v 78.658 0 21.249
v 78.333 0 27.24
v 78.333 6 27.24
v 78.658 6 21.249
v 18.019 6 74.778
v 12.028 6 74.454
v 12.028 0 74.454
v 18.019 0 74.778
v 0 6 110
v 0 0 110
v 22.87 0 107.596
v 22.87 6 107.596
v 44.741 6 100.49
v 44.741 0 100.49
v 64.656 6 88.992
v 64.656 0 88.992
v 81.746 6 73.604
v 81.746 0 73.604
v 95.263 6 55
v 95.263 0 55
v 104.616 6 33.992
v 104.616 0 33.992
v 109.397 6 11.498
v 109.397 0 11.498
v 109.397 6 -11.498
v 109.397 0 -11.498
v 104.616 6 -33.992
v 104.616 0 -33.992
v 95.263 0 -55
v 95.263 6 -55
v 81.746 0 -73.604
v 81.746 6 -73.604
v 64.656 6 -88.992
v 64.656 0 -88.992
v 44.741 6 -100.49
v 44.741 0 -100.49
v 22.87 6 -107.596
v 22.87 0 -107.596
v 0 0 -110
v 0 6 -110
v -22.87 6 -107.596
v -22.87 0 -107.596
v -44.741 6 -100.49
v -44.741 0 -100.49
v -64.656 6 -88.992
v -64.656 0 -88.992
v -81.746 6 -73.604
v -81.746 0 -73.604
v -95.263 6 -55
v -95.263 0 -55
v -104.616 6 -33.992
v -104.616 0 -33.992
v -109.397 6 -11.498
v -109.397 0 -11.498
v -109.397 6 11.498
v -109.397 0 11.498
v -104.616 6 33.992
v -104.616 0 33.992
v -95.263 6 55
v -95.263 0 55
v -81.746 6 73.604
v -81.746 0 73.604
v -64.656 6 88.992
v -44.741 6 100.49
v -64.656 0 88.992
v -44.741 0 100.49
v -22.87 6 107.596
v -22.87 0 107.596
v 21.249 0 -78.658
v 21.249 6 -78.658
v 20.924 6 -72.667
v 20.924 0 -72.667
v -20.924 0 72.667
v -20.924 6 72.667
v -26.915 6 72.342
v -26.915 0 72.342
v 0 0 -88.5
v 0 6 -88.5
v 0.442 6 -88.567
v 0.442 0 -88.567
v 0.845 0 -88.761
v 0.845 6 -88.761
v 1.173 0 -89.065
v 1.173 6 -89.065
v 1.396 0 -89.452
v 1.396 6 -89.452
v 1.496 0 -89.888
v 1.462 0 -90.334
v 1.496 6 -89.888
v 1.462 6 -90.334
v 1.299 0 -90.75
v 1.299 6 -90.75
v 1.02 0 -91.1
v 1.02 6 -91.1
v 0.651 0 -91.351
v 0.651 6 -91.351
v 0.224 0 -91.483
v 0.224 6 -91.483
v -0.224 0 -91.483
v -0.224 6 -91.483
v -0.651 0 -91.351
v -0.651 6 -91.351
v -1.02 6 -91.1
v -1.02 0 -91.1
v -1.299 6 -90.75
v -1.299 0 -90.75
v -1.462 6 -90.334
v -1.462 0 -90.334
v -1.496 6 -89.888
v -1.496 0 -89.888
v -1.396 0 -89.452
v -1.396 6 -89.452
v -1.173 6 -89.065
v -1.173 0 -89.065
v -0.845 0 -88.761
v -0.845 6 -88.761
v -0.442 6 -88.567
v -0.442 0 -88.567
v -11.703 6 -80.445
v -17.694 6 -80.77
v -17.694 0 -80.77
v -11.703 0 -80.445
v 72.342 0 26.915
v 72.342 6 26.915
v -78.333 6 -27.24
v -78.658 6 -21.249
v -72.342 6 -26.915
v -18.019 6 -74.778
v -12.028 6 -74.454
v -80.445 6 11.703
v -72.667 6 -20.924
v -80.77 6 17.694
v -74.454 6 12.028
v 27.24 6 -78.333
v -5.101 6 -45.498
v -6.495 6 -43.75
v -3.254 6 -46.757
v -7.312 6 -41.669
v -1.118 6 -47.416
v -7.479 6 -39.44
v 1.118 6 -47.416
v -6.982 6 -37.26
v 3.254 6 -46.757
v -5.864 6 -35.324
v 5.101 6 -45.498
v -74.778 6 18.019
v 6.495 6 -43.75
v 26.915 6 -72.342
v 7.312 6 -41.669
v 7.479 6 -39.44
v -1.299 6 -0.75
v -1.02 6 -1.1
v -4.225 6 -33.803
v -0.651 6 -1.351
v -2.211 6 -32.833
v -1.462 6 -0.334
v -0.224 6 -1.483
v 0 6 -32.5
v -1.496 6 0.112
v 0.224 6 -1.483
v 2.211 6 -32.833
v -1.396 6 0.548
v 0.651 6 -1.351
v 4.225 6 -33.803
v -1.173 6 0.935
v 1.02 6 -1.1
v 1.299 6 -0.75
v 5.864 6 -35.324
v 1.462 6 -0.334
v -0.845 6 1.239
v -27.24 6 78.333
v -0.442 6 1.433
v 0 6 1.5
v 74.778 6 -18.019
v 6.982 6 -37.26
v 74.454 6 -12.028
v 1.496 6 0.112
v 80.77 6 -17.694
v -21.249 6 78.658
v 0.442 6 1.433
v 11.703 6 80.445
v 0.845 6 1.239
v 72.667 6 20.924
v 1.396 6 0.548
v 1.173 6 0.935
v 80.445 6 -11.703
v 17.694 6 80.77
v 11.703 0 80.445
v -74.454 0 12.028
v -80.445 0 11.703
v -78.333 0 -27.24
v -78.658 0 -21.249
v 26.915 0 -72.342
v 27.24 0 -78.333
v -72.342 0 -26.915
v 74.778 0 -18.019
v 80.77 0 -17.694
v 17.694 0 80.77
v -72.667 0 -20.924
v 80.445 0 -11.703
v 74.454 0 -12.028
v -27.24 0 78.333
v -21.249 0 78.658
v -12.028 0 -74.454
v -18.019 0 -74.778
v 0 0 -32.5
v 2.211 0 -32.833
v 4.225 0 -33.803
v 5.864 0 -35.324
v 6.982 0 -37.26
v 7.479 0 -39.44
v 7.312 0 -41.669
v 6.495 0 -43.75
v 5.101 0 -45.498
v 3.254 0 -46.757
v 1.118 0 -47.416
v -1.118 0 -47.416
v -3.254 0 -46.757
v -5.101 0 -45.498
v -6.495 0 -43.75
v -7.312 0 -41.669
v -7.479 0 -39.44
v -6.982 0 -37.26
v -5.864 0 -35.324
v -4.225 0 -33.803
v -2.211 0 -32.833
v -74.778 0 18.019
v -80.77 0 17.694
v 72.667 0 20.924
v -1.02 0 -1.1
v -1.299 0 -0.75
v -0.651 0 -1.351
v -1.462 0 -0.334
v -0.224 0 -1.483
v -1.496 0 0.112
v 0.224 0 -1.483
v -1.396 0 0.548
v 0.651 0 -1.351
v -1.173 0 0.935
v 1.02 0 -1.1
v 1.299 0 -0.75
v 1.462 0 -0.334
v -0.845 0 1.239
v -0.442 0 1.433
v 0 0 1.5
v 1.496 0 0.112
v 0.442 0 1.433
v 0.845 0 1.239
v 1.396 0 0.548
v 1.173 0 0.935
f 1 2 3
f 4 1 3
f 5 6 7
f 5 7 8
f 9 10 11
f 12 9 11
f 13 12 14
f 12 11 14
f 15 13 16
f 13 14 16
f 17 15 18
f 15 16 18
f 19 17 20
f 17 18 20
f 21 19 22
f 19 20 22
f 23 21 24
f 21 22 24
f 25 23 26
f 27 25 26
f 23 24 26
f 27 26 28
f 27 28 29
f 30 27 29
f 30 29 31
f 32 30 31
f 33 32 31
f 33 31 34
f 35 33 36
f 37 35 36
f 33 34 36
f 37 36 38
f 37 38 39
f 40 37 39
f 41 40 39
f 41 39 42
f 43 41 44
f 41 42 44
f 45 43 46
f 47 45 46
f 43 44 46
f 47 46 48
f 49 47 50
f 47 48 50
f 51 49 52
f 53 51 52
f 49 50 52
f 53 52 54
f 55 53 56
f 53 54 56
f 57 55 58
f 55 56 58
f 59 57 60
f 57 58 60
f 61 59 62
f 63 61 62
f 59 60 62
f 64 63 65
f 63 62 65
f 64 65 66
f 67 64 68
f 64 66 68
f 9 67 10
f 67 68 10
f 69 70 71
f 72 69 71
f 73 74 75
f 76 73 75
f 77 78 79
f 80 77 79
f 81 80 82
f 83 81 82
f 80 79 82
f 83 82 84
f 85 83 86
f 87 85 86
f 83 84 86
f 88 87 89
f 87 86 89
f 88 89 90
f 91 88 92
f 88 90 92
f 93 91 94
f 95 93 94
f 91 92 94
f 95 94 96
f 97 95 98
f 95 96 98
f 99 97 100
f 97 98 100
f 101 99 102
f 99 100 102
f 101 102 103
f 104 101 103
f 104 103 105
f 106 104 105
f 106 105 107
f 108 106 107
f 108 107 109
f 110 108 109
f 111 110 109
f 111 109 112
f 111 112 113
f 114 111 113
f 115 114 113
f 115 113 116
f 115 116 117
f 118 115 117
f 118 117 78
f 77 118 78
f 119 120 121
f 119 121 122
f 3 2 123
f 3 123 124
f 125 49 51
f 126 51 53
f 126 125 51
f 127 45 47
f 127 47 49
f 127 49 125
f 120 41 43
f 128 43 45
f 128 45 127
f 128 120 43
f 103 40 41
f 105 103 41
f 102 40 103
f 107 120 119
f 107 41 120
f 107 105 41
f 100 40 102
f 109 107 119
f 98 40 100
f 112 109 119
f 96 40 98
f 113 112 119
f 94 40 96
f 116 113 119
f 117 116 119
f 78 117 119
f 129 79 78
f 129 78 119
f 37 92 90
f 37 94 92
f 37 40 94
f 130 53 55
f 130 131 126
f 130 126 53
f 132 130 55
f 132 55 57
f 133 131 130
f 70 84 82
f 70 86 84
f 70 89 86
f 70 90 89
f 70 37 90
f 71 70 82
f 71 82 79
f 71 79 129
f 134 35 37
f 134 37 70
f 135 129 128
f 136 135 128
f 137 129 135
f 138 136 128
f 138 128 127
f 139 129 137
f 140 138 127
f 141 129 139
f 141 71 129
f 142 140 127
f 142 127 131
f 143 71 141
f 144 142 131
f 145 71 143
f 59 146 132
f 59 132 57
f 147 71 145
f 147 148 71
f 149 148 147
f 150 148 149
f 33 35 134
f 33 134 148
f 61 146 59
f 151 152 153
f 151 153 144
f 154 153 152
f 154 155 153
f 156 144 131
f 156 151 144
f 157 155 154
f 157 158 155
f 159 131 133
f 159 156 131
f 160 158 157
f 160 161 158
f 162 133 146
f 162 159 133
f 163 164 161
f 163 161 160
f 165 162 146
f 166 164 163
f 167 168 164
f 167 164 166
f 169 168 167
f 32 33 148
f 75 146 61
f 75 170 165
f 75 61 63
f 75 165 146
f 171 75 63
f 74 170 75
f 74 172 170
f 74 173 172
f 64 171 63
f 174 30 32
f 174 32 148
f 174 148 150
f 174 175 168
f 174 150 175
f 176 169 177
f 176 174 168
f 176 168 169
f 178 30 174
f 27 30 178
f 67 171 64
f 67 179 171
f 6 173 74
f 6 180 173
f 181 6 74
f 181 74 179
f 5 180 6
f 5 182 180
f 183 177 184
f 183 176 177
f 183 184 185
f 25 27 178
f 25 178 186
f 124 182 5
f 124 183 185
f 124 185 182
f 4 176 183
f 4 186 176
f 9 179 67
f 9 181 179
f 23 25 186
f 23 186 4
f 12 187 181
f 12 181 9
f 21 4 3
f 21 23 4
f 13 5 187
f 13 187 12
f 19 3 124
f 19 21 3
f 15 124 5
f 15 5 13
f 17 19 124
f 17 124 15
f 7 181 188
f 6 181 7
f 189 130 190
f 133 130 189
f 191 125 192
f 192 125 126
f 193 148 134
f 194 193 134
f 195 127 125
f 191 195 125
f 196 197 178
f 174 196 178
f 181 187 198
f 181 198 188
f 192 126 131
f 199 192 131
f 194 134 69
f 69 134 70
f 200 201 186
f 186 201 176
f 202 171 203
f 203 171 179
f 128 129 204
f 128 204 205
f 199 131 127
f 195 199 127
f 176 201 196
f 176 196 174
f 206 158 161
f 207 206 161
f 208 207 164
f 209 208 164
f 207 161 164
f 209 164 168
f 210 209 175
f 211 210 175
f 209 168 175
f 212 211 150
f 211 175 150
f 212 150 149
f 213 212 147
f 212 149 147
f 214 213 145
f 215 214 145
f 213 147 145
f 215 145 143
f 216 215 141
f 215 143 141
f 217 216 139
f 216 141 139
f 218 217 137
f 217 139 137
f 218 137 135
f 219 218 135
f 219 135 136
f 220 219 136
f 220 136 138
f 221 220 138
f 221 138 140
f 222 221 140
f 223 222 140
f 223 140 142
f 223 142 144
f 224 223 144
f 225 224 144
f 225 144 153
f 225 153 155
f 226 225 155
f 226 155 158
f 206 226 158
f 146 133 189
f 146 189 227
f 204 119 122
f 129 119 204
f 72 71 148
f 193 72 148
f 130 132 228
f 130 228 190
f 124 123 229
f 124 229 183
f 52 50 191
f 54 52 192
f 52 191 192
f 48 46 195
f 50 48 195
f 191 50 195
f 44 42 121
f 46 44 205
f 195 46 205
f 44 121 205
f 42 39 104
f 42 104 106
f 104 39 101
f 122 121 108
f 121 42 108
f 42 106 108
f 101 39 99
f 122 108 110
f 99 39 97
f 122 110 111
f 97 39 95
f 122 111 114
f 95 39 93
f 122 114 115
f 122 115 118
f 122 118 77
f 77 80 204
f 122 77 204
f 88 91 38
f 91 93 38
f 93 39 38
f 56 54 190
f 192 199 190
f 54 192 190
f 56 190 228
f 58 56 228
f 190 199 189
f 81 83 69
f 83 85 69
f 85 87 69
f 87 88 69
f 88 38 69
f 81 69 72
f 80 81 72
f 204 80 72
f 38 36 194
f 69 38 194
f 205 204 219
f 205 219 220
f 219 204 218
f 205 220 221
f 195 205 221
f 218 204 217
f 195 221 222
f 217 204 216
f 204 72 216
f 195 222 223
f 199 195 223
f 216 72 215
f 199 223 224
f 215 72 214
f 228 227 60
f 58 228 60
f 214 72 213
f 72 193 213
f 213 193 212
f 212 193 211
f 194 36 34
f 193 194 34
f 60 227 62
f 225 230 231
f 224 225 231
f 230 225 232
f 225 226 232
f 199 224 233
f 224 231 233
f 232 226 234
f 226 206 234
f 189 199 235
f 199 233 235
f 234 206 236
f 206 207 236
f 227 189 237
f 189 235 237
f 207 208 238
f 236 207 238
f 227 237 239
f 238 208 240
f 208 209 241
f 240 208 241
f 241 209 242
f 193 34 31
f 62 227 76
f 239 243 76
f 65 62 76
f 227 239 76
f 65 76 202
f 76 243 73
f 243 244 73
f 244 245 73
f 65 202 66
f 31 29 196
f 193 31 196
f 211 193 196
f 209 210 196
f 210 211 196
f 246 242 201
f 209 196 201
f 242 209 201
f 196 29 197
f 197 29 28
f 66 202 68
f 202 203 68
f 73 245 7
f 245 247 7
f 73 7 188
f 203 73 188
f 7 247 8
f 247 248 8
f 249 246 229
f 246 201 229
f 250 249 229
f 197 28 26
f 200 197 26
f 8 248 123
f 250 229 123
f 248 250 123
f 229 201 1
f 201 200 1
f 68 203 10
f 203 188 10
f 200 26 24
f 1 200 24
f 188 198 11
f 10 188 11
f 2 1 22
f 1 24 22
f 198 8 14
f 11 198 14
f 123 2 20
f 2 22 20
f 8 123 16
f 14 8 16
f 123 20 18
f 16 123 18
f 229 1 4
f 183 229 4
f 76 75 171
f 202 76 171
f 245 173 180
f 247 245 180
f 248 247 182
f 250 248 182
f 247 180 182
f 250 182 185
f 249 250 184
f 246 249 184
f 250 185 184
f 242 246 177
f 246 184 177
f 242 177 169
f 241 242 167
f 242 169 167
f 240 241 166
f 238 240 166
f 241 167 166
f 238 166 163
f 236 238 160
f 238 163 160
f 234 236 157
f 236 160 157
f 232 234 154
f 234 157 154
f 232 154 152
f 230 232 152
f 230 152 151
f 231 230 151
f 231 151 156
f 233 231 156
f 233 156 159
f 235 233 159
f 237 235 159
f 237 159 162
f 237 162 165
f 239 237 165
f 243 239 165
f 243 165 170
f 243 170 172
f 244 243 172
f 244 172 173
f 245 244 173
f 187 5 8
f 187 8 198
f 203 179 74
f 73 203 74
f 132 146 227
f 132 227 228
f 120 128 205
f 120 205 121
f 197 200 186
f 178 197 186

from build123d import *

# Parameters (mm, degrees)
SKETCH1_R           = 110
BOSS_EXTRUDE1_DEPTH = 6
SKETCH2_R           = 7.5
CUT_EXTRUDE1_DEPTH  = 156.679157243
CAVITY1_START       = 73.692998072
CAVITY1_OUTLINE_W   = 6
CAVITY1_OUTLINE_H   = 6
CAVITY1_DEPTH       = 6
CUT_EXTRUDE2_DEPTH  = 156.679157243
SKETCH6_R           = 1.5
CUT_EXTRUDE3_DEPTH  = 156.679157243


# Read off the part's stored shape, not the designer's step: Cavity1
with BuildPart() as part:
    # Sketch1 → Boss-Extrude1 (new body)
    with BuildSketch(Plane(origin=(0, 0, 0), x_dir=(1, 0, 0), z_dir=(0, 1, 0))):
        with Locations(Location((0, 0, 0), (0, 0, 270))):
            Circle(SKETCH1_R)
    extrude(amount=BOSS_EXTRUDE1_DEPTH)

    # Sketch2 → Cut-Extrude1 (cut, through all)
    with BuildSketch(Plane(origin=(0, 6, 0), x_dir=(1, 0, 0), z_dir=(0, 1, 0))):
        with Locations(Location((0, 40, 0), (0, 0, 270))):
            Circle(SKETCH2_R)
    extrude(amount=-CUT_EXTRUDE1_DEPTH, mode=Mode.SUBTRACT)

    # Cavity1 outline → Cavity1 (cut)
    with BuildSketch(Plane(origin=(0, 0, 0), x_dir=(0, 1, 0), z_dir=(0.998532697756286, 0, 0.0541521145621647)).offset(CAVITY1_START)):
        with Locations((3, -19.041827)):
            Rectangle(CAVITY1_OUTLINE_W, CAVITY1_OUTLINE_H)
        with Locations((3, 19.958173)):
            Rectangle(CAVITY1_OUTLINE_W, CAVITY1_OUTLINE_H)
    extrude(amount=CAVITY1_DEPTH, mode=Mode.SUBTRACT)

    # Sketch3 → Cut-Extrude2 (cut, through all)
    with BuildSketch(Plane(origin=(0, 6, 0), x_dir=(1, 0, 0), z_dir=(0, 1, 0))):
        Polygon((-21.248834596, -78.65774343), (-20.923921909, -72.666547244), (-26.915118096, -72.341634556), (-27.240030783, -78.332830743), align=None)
        Polygon((17.693940616, -80.769675898), (11.702744429, -80.444763211), (12.027657117, -74.453567024), (18.018853303, -74.778479712), align=None)
        Polygon((-78.65774343, 21.248834596), (-72.666547244, 20.923921909), (-72.341634556, 26.915118096), (-78.332830743, 27.240030783), align=None)
        Polygon((-80.769675898, -17.693940616), (-80.444763211, -11.702744429), (-74.453567024, -12.027657117), (-74.778479712, -18.018853303), align=None)
        Polygon((21.248834596, 78.65774343), (20.923921909, 72.666547244), (26.915118096, 72.341634556), (27.240030783, 78.332830743), align=None)
        Polygon((-17.693940616, 80.769675898), (-11.702744429, 80.444763211), (-12.027657117, 74.453567024), (-18.018853303, 74.778479712), align=None)
    extrude(amount=-CUT_EXTRUDE2_DEPTH, mode=Mode.SUBTRACT)

    # Sketch6 → Cut-Extrude3 (cut, through all)
    with BuildSketch(Plane(origin=(0, 6, 0), x_dir=(1, 0, 0), z_dir=(0, 1, 0))):
        with Locations(Location((0, 90, 0), (0, 0, 270))):
            Circle(SKETCH6_R)
        with Locations(Location((0, 0, 0), (0, 0, 270))):
            Circle(SKETCH6_R)
    extrude(amount=-CUT_EXTRUDE3_DEPTH, mode=Mode.SUBTRACT)


solid = part.part
